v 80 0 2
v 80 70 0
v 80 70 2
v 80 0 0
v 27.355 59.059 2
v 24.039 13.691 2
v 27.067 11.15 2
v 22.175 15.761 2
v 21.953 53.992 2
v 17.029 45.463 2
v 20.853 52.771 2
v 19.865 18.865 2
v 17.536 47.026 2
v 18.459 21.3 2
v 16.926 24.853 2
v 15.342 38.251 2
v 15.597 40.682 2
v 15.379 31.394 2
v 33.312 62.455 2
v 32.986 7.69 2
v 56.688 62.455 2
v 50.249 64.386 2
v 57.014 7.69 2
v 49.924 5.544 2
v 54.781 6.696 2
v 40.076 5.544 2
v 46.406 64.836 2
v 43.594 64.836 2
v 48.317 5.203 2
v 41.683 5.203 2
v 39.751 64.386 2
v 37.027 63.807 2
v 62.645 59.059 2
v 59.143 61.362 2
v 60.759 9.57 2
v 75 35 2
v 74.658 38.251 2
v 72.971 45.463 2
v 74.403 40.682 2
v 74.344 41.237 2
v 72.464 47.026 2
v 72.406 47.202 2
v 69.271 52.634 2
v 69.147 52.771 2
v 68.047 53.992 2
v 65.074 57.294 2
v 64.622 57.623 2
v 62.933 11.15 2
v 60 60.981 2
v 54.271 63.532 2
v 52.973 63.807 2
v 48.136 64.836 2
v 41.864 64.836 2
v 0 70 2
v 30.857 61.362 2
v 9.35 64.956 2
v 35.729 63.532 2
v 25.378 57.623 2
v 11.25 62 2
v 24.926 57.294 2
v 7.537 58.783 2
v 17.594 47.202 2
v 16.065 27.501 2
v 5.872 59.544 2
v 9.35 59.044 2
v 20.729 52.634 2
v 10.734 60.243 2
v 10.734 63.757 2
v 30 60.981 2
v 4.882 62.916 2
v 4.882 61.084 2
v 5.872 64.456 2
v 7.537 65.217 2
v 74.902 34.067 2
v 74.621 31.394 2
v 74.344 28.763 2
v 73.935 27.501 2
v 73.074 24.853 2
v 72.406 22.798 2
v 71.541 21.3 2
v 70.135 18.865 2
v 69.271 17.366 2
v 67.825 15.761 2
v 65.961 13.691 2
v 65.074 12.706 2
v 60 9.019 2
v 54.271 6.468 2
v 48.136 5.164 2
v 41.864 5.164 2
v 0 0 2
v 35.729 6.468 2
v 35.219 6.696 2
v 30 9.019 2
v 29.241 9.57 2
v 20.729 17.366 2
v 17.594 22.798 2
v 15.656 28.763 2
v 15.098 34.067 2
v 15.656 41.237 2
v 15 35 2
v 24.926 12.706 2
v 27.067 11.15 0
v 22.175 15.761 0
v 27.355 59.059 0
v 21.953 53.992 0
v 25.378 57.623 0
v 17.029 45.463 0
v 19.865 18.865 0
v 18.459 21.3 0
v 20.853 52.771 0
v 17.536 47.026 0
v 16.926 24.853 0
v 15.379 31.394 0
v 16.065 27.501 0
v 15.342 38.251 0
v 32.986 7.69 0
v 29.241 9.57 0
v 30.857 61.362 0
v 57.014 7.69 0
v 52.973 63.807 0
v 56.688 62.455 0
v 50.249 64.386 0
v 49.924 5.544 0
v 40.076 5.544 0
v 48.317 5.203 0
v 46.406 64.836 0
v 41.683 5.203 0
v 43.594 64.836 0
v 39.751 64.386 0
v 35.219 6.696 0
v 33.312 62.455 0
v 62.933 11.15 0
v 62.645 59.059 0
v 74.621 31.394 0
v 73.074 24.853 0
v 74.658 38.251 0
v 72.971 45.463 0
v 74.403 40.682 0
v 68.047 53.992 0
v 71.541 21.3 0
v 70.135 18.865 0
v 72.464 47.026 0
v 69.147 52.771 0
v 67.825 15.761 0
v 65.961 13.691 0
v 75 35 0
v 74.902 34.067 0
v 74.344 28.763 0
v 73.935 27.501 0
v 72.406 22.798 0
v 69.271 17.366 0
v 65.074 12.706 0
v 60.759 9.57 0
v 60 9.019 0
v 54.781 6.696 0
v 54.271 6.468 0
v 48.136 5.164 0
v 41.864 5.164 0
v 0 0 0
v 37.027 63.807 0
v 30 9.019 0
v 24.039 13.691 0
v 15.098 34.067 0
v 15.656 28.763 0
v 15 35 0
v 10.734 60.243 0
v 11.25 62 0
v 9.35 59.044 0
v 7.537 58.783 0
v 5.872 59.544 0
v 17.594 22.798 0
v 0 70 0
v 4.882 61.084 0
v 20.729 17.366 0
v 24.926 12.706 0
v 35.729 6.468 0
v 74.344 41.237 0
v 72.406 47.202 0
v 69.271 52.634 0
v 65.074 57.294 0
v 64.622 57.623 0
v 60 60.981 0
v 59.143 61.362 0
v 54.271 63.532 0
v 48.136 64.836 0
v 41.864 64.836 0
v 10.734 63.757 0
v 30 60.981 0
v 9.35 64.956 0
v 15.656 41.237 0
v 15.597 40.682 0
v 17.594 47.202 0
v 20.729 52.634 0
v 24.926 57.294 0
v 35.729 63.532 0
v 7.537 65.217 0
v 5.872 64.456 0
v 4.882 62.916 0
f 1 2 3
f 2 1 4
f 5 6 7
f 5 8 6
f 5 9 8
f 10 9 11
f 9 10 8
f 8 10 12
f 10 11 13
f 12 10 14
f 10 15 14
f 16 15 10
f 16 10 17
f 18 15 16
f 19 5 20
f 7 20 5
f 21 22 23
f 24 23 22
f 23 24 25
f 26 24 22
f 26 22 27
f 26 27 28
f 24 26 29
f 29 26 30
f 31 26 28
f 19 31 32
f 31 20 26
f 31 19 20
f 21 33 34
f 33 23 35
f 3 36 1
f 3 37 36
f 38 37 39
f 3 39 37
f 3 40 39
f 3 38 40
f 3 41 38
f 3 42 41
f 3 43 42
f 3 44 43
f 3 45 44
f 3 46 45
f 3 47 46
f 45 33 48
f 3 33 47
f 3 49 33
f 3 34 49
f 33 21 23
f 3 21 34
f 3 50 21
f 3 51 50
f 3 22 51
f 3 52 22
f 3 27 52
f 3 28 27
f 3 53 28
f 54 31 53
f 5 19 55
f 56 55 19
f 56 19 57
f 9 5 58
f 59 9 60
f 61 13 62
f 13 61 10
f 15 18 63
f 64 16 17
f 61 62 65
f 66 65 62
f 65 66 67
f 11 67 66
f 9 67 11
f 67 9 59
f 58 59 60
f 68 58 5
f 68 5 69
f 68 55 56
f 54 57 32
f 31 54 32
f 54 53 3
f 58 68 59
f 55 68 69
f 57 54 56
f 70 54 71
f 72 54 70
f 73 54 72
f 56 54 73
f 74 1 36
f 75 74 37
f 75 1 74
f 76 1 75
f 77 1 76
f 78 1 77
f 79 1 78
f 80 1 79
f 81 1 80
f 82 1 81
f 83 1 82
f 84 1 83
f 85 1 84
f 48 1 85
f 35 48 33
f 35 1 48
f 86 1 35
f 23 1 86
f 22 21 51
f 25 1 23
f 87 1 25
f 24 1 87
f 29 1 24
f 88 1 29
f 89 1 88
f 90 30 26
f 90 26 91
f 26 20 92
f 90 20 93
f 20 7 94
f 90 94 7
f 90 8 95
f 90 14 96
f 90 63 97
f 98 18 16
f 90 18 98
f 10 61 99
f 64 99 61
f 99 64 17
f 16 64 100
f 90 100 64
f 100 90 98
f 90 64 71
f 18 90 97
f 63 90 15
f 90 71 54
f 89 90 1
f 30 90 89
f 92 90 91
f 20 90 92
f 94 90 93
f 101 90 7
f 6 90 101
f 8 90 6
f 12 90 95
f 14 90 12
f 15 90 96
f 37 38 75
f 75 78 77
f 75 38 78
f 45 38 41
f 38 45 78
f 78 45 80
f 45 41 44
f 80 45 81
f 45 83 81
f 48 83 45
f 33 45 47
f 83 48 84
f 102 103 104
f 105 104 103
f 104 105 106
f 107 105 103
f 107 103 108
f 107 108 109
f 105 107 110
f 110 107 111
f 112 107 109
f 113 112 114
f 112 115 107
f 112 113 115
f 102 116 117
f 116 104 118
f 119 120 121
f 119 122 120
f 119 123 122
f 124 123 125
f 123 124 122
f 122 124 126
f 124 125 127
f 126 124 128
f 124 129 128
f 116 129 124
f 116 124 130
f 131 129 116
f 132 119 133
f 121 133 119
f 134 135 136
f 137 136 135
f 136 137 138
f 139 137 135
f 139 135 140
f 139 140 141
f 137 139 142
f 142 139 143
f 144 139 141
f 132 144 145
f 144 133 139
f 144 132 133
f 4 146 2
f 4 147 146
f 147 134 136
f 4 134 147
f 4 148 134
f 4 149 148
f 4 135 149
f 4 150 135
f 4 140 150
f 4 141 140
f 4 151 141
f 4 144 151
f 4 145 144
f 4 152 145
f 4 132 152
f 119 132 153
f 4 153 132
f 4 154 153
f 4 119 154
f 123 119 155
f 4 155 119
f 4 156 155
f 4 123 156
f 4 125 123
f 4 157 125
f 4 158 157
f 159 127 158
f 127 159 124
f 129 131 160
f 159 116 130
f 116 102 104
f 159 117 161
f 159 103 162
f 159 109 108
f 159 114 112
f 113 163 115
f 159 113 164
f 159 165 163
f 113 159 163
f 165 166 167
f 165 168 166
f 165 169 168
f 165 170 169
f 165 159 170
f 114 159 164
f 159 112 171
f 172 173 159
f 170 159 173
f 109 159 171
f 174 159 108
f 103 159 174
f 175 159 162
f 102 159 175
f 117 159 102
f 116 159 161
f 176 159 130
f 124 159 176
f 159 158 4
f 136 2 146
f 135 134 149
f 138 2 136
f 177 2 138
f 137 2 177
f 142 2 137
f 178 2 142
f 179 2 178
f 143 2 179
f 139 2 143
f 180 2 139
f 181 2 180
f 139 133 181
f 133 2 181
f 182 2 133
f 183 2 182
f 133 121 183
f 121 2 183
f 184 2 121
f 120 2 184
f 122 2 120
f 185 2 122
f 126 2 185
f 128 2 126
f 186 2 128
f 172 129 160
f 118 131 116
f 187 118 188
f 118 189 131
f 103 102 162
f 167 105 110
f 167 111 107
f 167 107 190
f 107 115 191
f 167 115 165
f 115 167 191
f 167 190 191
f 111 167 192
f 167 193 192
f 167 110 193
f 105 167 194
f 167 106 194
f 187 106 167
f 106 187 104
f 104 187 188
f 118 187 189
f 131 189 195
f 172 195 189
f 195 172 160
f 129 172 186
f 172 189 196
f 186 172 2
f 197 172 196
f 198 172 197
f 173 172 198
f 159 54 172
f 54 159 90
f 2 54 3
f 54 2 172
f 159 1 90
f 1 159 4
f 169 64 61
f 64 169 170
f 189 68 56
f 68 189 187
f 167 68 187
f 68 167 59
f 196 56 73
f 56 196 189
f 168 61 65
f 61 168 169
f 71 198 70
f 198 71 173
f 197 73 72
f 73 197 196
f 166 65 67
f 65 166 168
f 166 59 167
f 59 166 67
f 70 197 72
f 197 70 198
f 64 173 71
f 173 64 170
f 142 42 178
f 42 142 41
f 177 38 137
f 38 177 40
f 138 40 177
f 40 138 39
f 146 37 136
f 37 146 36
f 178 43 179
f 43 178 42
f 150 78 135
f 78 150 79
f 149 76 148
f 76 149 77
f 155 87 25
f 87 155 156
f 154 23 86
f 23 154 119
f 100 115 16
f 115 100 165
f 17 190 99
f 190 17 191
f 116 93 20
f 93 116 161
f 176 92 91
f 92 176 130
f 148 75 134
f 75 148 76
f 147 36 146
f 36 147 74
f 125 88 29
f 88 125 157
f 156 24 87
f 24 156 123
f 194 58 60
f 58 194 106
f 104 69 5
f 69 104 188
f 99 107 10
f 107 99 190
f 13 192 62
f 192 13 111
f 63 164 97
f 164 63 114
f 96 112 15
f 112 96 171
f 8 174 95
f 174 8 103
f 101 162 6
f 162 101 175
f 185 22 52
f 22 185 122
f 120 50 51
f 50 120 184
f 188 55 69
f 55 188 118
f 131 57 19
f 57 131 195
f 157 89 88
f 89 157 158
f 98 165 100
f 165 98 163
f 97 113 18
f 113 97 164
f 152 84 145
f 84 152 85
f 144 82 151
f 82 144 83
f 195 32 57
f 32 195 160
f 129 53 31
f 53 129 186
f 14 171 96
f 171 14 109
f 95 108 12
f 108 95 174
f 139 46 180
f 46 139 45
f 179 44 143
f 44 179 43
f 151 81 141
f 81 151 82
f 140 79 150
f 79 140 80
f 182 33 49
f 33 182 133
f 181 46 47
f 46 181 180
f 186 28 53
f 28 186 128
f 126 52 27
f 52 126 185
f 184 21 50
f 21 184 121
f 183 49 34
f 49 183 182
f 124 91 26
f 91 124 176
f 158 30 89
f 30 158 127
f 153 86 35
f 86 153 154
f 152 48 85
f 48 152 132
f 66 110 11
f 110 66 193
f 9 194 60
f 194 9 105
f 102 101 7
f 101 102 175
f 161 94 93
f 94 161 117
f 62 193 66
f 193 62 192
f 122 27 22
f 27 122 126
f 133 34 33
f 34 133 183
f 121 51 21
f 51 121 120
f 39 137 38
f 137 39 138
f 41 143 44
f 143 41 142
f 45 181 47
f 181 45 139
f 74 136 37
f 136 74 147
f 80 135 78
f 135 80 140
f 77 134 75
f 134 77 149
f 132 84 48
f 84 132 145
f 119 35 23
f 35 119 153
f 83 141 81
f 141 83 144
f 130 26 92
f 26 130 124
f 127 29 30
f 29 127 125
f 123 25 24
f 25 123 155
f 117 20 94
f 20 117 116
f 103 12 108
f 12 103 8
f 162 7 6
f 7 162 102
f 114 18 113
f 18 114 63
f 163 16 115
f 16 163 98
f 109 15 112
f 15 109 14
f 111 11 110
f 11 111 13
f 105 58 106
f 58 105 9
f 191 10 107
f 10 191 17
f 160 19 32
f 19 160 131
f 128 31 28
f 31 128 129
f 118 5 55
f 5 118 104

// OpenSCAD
font = "FreeMono:style=Bold";

module m1() {
    difference() {
        cube([80,70,2]);
        translate([8,62,-1]) cylinder(d=6.5,h=4);
        translate([45,35,-1]) cylinder(d=60,h=4);
    }
}

module seg(n) {
    translate([45,35,0])
    rotate([0,0,90-n*40])
    rotate_extrude(angle=-40)
    polygon([
        [0,0],
        [30,0],
        [30,2],
        [0,2]
    ]);
}

material = 0;
if (material == 0) {
    m1();
    color("magenta") seg(0);
    color("red") seg(1);
    color("orange") seg(2);
    color("yellow") seg(3);
    color("green") seg(4);
    color("aqua") seg(5);
    color("blue") seg(6);
    color("purple") seg(7);
    color("violet") seg(8);
} else if (material <= 10) {
    seg(material-1);
}
